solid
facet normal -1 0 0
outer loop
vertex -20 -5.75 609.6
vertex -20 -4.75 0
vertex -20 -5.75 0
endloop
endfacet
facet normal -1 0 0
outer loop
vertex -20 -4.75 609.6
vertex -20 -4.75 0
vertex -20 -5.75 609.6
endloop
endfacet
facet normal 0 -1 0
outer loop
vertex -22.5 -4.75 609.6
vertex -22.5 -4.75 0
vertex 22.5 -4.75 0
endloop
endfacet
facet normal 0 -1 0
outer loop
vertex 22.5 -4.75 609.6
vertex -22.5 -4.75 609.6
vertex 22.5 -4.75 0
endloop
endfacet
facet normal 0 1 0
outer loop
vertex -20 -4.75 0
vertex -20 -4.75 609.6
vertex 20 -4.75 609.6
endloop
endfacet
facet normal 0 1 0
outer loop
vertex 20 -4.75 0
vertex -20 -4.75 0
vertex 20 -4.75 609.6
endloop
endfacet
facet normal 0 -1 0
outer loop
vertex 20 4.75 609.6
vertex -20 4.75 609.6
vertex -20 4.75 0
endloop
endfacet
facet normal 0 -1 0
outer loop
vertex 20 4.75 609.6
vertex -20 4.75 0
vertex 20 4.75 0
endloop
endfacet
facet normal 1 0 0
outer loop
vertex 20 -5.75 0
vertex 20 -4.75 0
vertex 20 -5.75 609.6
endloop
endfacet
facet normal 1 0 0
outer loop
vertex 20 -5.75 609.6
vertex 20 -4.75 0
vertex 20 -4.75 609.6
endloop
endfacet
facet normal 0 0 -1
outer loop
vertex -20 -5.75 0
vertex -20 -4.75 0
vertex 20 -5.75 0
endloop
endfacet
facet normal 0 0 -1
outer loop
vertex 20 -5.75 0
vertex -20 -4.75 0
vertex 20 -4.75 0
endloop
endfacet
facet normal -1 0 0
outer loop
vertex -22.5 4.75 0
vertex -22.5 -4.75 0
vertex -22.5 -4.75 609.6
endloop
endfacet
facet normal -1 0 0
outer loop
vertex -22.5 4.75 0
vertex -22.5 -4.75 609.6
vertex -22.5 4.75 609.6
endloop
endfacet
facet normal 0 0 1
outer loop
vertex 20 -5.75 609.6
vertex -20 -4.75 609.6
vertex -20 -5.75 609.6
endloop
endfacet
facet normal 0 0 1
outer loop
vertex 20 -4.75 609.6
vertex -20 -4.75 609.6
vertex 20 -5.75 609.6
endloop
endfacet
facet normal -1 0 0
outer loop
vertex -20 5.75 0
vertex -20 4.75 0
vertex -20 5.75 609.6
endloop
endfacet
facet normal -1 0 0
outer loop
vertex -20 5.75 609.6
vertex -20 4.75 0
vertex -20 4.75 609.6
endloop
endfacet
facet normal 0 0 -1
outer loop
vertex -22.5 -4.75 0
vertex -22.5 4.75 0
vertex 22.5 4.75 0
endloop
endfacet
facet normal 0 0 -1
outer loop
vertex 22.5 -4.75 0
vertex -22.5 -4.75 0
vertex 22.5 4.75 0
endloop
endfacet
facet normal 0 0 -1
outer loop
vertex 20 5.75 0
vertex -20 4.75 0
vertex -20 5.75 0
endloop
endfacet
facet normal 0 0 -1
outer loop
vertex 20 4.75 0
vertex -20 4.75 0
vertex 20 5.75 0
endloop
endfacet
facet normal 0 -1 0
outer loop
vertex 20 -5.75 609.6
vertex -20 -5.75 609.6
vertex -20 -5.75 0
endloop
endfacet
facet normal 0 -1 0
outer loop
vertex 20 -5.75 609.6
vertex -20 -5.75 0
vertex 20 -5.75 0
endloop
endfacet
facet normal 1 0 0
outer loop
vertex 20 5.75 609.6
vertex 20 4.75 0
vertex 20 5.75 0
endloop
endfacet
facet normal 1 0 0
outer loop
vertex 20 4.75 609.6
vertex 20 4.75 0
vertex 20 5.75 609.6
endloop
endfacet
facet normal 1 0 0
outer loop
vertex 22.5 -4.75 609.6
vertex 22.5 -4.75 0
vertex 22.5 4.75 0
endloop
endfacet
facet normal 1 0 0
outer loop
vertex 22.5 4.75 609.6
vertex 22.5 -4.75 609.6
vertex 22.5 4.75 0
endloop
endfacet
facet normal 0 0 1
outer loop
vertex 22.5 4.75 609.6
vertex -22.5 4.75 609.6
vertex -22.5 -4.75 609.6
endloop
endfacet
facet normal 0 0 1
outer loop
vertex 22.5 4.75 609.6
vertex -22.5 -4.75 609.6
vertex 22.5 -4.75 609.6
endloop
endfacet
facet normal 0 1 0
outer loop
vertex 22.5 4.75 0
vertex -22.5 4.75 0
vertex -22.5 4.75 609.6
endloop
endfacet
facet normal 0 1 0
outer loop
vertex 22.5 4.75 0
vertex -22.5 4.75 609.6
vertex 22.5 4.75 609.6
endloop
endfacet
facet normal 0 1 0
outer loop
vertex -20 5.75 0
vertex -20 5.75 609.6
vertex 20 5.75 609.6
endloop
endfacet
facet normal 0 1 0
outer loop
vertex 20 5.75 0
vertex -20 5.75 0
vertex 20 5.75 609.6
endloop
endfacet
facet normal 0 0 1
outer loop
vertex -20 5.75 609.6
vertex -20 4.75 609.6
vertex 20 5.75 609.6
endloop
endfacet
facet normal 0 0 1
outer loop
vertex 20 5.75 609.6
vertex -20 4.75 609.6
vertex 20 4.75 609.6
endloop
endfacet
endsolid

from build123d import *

# Parameters (mm, degrees)
F0_W     = 45
F0_H     = 9.5
F1_DEPTH = 609.6
F2_W     = 40
F2_H     = 609.6
F3_DEPTH = 1


with BuildPart() as f1:
    # F0 (on Top) → F1 (new body)
    with BuildSketch(Plane.XY):
        Rectangle(F0_W, F0_H)
    extrude(amount=F1_DEPTH)


with BuildPart() as f3:
    # F2 (on face) → F3 (new body)
    with BuildSketch(Plane.XZ.offset(4.75)):
        with Locations((0, 304.8)):
            Rectangle(F2_W, F2_H)
    extrude(amount=F3_DEPTH)


with BuildPart() as f4_1:
    # F4: instance of F3
    add(f3.part.mirror(Plane.XZ))


solid = Compound([f1.part, f3.part, f4_1.part])
